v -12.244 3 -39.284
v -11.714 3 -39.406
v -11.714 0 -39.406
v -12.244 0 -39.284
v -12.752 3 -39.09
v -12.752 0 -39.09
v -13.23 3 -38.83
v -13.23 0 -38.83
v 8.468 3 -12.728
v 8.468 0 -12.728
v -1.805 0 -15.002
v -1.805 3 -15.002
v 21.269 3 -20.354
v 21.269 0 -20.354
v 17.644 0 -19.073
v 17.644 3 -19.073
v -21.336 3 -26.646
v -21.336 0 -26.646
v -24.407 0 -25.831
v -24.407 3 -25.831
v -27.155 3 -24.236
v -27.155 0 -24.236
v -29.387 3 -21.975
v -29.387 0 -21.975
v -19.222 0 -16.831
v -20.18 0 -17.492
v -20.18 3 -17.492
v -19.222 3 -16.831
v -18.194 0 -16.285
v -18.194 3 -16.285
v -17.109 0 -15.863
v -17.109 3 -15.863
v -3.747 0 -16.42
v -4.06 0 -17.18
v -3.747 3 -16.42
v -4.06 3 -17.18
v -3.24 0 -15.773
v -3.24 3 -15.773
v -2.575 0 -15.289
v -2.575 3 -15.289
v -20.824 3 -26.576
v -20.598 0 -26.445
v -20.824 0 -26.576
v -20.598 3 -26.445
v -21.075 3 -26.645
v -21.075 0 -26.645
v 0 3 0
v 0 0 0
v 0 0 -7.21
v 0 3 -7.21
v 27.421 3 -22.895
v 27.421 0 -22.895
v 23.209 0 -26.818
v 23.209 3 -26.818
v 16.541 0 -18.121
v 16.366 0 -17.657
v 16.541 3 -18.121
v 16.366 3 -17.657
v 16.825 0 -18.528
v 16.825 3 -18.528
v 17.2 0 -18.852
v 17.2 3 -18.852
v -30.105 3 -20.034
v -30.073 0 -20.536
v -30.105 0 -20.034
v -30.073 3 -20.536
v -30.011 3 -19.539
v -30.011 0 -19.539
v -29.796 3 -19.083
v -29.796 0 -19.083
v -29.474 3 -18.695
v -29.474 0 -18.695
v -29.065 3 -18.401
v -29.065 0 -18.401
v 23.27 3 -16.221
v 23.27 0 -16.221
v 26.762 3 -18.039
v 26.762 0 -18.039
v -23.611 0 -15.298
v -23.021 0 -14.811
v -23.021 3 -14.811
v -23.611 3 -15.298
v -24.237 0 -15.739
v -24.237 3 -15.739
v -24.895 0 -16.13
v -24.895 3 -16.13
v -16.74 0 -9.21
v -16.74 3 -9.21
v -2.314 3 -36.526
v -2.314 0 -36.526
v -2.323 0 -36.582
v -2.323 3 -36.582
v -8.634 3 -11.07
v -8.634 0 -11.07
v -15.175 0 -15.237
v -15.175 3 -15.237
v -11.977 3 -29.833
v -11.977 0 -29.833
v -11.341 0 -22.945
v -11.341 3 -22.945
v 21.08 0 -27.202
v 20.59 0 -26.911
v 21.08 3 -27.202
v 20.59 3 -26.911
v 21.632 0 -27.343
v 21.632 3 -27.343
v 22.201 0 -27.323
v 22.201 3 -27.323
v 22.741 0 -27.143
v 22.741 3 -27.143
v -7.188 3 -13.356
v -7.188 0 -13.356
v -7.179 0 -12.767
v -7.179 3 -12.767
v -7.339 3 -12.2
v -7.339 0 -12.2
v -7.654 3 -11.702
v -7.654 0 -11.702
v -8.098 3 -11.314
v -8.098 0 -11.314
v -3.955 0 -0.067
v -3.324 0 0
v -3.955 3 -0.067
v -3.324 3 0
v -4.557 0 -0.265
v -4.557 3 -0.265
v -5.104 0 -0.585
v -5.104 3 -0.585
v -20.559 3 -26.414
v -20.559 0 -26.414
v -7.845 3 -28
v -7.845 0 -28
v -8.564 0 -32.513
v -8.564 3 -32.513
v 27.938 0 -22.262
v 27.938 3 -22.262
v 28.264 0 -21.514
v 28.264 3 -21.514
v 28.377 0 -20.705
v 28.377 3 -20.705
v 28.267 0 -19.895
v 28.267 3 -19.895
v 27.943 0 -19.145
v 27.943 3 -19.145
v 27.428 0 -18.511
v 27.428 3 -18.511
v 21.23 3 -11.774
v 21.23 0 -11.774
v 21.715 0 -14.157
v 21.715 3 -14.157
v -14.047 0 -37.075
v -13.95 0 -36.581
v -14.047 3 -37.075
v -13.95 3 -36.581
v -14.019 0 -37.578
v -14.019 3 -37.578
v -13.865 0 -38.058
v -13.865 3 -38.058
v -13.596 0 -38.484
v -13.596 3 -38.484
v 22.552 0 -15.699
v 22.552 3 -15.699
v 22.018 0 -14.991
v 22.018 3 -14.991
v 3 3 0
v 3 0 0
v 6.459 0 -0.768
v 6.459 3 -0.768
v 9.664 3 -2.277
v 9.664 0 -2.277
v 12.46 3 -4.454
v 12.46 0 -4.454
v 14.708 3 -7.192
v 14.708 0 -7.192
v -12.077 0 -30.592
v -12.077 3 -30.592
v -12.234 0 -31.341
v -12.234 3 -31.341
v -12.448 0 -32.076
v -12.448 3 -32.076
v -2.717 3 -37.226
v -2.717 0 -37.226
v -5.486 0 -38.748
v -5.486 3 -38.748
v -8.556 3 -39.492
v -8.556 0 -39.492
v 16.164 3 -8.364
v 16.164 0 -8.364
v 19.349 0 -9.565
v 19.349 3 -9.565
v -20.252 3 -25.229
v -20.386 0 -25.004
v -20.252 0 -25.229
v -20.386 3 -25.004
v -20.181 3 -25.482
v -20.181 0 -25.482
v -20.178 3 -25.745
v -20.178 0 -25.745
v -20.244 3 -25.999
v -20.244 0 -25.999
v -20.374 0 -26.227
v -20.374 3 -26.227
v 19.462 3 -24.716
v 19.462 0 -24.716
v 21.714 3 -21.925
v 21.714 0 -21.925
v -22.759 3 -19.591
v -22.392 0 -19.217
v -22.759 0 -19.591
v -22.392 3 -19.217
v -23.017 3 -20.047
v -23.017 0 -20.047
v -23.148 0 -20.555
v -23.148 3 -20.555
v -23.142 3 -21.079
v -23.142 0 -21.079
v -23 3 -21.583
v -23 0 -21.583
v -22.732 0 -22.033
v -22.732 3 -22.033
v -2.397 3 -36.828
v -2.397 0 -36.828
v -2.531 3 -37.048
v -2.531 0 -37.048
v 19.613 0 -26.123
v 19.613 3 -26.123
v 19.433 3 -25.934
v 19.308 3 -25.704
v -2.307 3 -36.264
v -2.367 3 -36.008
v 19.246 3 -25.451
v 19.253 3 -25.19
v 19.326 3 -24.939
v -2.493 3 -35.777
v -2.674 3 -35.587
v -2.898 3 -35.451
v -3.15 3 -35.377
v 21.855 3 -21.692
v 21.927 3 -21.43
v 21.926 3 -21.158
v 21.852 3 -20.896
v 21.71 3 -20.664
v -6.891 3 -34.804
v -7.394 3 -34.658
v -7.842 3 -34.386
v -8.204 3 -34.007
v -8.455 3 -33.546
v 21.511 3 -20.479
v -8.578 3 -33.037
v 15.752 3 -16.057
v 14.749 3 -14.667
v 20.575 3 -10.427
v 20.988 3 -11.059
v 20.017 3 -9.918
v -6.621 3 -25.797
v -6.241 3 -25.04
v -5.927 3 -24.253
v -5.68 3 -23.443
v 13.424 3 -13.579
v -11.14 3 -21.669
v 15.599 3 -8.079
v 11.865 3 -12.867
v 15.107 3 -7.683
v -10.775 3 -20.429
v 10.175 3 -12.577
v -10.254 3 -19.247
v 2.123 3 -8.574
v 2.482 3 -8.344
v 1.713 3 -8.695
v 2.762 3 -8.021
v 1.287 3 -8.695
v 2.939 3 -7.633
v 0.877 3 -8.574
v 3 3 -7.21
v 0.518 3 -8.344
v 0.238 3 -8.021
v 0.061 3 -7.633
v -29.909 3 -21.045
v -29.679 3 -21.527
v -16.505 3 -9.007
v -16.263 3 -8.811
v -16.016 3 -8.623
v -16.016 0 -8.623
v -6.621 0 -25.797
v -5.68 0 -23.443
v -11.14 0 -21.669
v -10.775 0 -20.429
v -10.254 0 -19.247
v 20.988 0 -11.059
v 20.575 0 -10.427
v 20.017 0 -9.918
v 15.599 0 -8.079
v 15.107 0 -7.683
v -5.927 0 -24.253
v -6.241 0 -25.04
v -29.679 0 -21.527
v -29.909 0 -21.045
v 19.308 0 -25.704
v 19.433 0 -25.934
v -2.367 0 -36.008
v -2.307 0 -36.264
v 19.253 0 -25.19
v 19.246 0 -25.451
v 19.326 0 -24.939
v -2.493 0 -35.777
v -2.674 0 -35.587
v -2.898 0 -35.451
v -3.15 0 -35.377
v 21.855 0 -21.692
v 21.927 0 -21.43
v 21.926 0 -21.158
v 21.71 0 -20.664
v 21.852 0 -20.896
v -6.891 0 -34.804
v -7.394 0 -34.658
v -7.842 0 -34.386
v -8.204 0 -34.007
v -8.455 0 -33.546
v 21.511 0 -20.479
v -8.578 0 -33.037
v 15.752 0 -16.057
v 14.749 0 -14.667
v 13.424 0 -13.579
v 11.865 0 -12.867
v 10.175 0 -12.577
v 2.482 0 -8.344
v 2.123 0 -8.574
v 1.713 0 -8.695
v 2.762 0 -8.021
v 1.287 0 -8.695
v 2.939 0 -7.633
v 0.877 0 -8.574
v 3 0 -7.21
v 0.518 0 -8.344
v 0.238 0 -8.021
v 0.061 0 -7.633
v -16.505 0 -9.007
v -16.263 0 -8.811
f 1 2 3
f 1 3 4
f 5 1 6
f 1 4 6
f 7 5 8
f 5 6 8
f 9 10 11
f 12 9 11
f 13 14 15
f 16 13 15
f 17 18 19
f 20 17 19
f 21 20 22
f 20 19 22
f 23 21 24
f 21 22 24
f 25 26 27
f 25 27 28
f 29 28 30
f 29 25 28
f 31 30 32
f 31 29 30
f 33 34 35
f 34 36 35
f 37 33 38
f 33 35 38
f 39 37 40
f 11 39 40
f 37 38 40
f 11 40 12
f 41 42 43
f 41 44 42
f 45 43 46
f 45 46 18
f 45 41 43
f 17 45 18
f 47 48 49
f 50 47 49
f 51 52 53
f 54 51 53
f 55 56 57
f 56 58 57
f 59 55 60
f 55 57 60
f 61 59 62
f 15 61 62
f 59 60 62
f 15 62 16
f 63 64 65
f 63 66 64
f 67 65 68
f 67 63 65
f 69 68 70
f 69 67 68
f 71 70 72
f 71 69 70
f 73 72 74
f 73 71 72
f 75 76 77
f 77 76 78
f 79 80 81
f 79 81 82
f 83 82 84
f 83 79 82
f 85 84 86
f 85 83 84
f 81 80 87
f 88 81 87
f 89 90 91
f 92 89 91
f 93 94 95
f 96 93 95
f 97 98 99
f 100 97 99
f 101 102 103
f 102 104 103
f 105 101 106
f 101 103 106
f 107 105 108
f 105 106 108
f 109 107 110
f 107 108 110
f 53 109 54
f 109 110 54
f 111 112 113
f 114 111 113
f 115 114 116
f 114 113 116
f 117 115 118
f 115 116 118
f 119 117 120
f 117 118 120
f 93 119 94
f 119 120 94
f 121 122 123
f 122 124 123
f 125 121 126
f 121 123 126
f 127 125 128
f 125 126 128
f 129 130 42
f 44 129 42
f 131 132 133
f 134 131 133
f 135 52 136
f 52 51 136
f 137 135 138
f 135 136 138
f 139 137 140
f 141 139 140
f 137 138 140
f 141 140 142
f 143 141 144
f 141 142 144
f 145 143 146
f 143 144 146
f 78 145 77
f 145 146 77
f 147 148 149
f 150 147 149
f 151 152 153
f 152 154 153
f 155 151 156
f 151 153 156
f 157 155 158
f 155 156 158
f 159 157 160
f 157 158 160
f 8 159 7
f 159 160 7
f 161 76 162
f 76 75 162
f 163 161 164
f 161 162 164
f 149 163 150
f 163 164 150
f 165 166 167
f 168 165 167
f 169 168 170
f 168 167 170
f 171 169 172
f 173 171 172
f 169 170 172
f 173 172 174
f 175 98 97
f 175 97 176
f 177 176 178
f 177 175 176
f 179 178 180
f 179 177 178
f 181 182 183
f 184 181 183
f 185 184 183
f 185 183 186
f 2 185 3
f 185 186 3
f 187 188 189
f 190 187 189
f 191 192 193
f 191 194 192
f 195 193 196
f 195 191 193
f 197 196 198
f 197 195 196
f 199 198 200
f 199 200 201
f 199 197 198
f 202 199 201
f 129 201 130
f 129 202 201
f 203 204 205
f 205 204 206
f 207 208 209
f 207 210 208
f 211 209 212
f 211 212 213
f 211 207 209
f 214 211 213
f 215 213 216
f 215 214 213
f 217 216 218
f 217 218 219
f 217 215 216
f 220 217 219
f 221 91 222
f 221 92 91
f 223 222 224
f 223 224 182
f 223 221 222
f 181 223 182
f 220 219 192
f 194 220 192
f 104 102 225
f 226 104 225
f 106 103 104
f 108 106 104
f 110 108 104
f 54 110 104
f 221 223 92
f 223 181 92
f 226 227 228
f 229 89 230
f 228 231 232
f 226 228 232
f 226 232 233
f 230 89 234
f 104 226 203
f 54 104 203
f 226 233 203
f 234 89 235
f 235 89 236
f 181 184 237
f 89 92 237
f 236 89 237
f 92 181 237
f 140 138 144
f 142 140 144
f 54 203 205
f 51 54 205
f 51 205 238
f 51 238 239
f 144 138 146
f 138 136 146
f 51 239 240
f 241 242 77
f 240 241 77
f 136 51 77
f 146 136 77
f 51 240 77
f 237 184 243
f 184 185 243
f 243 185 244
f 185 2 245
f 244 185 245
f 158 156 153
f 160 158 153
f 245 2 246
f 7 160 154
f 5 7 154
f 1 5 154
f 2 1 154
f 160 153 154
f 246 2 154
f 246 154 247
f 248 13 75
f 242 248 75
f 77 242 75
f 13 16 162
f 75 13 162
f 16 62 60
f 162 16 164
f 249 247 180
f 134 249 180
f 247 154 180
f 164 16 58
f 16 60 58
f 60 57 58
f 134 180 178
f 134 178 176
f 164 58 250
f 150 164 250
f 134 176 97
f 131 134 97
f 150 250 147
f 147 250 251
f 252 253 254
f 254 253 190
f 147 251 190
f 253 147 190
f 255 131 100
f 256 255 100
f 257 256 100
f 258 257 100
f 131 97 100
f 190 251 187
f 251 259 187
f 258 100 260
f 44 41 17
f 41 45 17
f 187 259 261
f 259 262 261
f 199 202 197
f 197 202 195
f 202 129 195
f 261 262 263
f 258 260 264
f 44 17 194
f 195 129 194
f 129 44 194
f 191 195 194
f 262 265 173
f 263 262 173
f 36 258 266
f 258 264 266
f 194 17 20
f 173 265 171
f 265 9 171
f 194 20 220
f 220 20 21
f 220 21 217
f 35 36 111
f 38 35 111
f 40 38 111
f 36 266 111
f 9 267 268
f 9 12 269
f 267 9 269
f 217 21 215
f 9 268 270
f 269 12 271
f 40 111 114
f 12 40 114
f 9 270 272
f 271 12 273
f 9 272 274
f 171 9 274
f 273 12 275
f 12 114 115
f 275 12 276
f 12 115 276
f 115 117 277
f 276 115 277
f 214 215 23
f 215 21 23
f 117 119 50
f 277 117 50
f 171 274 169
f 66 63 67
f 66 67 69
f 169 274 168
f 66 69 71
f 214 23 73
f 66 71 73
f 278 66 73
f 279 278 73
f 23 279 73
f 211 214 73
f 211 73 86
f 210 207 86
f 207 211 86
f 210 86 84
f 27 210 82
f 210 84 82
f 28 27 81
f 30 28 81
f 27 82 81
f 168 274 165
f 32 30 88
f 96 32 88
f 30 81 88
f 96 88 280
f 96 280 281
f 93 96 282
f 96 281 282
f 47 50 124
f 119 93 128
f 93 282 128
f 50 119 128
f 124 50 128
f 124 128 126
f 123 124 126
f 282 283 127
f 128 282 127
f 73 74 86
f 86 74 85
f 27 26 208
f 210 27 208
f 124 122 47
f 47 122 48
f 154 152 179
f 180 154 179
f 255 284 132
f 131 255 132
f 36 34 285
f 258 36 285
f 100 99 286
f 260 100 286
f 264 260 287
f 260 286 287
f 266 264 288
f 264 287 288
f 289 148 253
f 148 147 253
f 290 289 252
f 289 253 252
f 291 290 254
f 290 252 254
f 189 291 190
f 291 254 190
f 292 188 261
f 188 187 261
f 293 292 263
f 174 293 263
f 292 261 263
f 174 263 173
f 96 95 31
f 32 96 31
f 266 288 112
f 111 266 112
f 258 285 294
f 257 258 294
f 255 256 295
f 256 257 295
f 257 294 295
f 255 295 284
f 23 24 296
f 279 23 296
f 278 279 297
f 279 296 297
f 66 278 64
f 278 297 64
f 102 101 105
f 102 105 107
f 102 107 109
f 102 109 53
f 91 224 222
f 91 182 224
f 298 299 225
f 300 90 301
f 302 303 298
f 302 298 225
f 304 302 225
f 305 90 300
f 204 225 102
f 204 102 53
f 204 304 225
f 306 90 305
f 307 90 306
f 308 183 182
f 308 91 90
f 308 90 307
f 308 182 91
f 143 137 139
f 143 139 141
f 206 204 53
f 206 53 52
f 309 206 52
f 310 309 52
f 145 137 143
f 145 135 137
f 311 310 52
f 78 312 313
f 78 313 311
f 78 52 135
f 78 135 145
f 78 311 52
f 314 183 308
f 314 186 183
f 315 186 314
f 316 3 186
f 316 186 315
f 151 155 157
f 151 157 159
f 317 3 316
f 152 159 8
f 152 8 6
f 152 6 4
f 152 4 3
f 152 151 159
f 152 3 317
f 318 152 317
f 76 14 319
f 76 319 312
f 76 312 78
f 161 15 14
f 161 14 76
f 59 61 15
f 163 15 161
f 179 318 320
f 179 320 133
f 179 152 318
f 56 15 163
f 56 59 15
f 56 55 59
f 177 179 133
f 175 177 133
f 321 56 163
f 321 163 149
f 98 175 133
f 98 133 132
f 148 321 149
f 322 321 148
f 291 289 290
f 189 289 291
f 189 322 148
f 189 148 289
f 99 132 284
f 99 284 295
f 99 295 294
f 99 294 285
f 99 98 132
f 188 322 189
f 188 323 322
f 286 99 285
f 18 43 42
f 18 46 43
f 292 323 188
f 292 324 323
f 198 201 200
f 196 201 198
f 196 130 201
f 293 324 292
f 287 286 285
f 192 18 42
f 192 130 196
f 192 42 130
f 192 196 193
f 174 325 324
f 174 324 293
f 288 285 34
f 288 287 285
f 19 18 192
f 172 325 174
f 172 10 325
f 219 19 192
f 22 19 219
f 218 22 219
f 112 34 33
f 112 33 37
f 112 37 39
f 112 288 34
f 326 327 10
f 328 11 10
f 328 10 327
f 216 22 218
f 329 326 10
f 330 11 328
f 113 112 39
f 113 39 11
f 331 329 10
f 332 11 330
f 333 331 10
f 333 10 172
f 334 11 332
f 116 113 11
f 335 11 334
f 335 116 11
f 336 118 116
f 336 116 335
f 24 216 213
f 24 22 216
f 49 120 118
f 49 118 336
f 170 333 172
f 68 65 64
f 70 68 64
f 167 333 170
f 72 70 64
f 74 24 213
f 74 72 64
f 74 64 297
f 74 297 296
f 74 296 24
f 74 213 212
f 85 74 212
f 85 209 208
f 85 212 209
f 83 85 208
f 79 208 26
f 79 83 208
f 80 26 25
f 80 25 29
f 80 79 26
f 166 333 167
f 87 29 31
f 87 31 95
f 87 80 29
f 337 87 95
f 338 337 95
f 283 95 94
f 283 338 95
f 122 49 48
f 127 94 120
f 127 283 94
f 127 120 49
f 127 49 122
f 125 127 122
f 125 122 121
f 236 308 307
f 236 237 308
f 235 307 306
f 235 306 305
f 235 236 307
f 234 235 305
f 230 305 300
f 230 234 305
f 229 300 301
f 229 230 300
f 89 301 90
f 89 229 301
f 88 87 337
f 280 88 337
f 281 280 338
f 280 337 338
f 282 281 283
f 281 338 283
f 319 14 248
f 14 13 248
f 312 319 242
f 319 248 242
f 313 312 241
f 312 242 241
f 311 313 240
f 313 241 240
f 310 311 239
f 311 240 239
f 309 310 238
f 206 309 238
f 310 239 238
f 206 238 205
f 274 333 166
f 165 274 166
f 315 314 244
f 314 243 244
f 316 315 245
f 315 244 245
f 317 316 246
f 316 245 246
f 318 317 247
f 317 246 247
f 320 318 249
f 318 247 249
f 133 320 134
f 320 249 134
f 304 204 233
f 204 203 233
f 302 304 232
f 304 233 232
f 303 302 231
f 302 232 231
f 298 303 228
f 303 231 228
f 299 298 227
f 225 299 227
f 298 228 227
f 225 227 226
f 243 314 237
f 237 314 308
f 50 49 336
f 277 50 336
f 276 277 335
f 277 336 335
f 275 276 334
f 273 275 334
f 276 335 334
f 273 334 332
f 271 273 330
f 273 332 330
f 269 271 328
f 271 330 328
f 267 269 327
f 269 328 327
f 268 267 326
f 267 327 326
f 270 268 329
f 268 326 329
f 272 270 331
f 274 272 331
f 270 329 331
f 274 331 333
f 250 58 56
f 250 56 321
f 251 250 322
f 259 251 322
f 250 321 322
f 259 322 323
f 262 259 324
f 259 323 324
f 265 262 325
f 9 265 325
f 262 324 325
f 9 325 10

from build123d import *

# Parameters (mm, degrees)
BOSS_EXTRUDE1_DEPTH = 3
FILLET1_R           = 10
FILLET2_R           = 2
FILLET3_R           = 4
FILLET4_R           = 1
FILLET5_R           = 2
FILLET6_R           = 3
FILLET7_R           = 2
FILLET8_R           = 1


with BuildPart() as part:
    # Sketch1 → Boss-Extrude1 (new body)
    with BuildSketch(Plane(origin=(0, 0, 0), x_dir=(1, 0, 0), z_dir=(0, 1, 0))):
        with BuildLine():
            Line((0, 0), (0, 7.21))
            ThreePointArc((0, 7.21), (1.5, 8.71), (3, 7.21))
            Line((3, 7.21), (3, 0))
            ThreePointArc((3, 0), (10.063508451, 2.530649612), (15.2, 8))
            Line((15.2, 8), (20.9, 10.15))
            Line((20.9, 10.15), (22, 15.56))
            Line((22, 15.56), (30.53, 20))
            Line((30.53, 20), (21.94, 28))
            Line((21.94, 28), (18.834507406, 25.494802254))
            Line((18.834507406, 25.494802254), (22.601722061, 20.824888578))
            Line((22.601722061, 20.824888578), (16.53, 18.68))
            ThreePointArc((16.53, 18.68), (13.852574152, 13.870404311), (8.467766761, 12.728183128))
            Line((8.467766761, 12.728183128), (-3.6, 15.4))
            Line((-3.6, 15.4), (-6, 24.68))
            Line((-6, 24.68), (-7.84518958, 28))
            Line((-7.84518958, 28), (-8.88, 34.5))
            Line((-8.88, 34.5), (-2.152236064, 35.529882091))
            Line((-2.152236064, 35.529882091), (-2.387170471, 36.974018228))
            ThreePointArc((-2.387170471, 36.974018228), (-7.295622624, 39.289989721), (-12.7222653, 39.199569746))
            Line((-12.7222653, 39.199569746), (-14.412236064, 37.968616292))
            Line((-14.412236064, 37.968616292), (-12.083283256, 30.98175787))
            Line((-12.083283256, 30.98175787), (-11.160586433, 20.989038892))
            Line((-11.160586433, 20.989038892), (-7.18770511, 13.356453829))
            ThreePointArc((-7.18770511, 13.356453829), (-7.478060289, 11.939326713), (-8.633960614, 11.06958547))
            Line((-8.633960614, 11.06958547), (-15.174962181, 15.236636279))
            Line((-15.174962181, 15.236636279), (-18.788682966, 16.406314301))
            Line((-18.788682966, 16.406314301), (-23.978484738, 20.454374352))
            Line((-23.978484738, 20.454374352), (-19.760487577, 25.795906403))
            Line((-19.760487577, 25.795906403), (-20.917206202, 26.691855832))
            ThreePointArc((-20.917206202, 26.691855832), (-26.082048226, 24.977316424), (-29.953541863, 21.152819654))
            Line((-29.953541863, 21.152819654), (-30.35, 19.1))
            Line((-30.35, 19.1), (-23.881685757, 15.578477225))
            Line((-23.881685757, 15.578477225), (-16.391850065, 8.899542932))
            Line((-16.391850065, 8.899542932), (-4.31, 0))
            Line((-4.31, 0), (0, 0))
        make_face()
    extrude(amount=BOSS_EXTRUDE1_DEPTH)

    # Fillet1
    # the kernel refuses this fillet: 10 mm, written as the material it adds along each edge
    with BuildSketch(Plane(origin=(-23.881685757, 0, -15.578477225), x_dir=(0.7463543086555258, 0, 0.6655488306287767), z_dir=(0, 1, 0))) as fillet1_piece_1:
        with BuildLine():
            CenterArc((FILLET1_R * 0.115344853594, -FILLET1_R), FILLET1_R, 90, 13.159392789)
            Line((-FILLET1_R * 0.112315955105, -FILLET1_R * 0.0262595026484), (0, 0))
            Line((0, 0), (FILLET1_R * 0.115344853594, 0))
        make_face()
    extrude(amount=3)
    with BuildSketch(Plane(origin=(-18.788682966, 0, -16.406314301), x_dir=(0.9514034075145552, 0, 0.3079473269403278), z_dir=(0, 1, 0))) as fillet1_piece_2:
        with BuildLine():
            CenterArc((FILLET1_R * 0.176495798458, FILLET1_R), FILLET1_R, 249.981238779, 20.018761221)
            Line((-FILLET1_R * 0.165832024258, FILLET1_R * 0.0604194224044), (0, 0))
            Line((0, 0), (FILLET1_R * 0.176495798458, 0))
        make_face()
    extrude(amount=3)
    with BuildSketch(Plane(origin=(-12.083283256, 0, -30.98175787), x_dir=(-0.3162277660168379, 0, -0.9486832980505138), z_dir=(0, 1, 0))) as fillet1_piece_3:
        with BuildLine():
            CenterArc((FILLET1_R * 0.115344853594, FILLET1_R), FILLET1_R, 256.840607211, 13.159392789)
            Line((-FILLET1_R * 0.112315955105, FILLET1_R * 0.0262595026484), (0, 0))
            Line((0, 0), (FILLET1_R * 0.115344853594, 0))
        make_face()
    extrude(amount=3)
    # the kernel refuses this fillet: 10 mm, written as the material it takes off along each edge
    with BuildSketch(Plane(origin=(-16.391850065, -1.167802292, -8.899542932), x_dir=(-0.7463543086555279, 0, -0.6655488306287745), z_dir=(0, 1, 0))) as fillet1_2_piece_1:
        with BuildLine():
            CenterArc((FILLET1_R * 0.0467120916838, -FILLET1_R), FILLET1_R, 90, 5.348923188)
            Line((-FILLET1_R * 0.0465086821366, -FILLET1_R * 0.00435453733353), (0, 0))
            Line((0, 0), (FILLET1_R * 0.0467120916838, 0))
        make_face()
    extrude(amount=5.335604584, mode=Mode.SUBTRACT)
    with BuildSketch(Plane(origin=(-11.160586433, -4.90982012, -20.989038892), x_dir=(-0.09194577532432974, 0, -0.9957640154173116), z_dir=(0, 1, 0))) as fillet1_2_piece_2:
        with BuildLine():
            CenterArc((FILLET1_R * 0.196392804796, -FILLET1_R), FILLET1_R, 90, 22.222134755)
            Line((-FILLET1_R * 0.18180564018, -FILLET1_R * 0.0742754533783), (0, 0))
            Line((0, 0), (FILLET1_R * 0.196392804796, 0))
        make_face()
    extrude(amount=12.81964024, mode=Mode.SUBTRACT)
    with BuildSketch(Plane(origin=(-6, -3.194649605, -24.68), x_dir=(0.2503828219685178, 0, 0.9681469116116013), z_dir=(0, 1, 0))) as fillet1_2_piece_3:
        with BuildLine():
            CenterArc((FILLET1_R * 0.127785984198, -FILLET1_R), FILLET1_R, 90, 14.564262893)
            Line((-FILLET1_R * 0.123679735642, -FILLET1_R * 0.0321337945019), (0, 0))
            Line((0, 0), (FILLET1_R * 0.127785984198, 0))
        make_face()
    extrude(amount=9.38929921, mode=Mode.SUBTRACT)

    # Fillet2
    fillet2_edges = [part.edges().sort_by_distance(p)[0] for p in [
        (-30.35, 1.5, -19.1),
        (-14.412236064, 1.5, -37.968616292),
    ]]
    fillet(fillet2_edges, radius=FILLET2_R)

    # Fillet3
    # the kernel refuses this fillet: 4 mm, written as the material it takes off along each edge
    with BuildSketch(Plane(origin=(-12.7222653, -2.572689519, -39.199569746), x_dir=(-0.8083072770831305, 0, 0.5887608562179175), z_dir=(0, 1, 0))) as fillet3_piece_1:
        with BuildLine():
            CenterArc((0.875361271, 3.992337402), FILLET3_R, 243.063834504, 23.389134387)
            ThreePointArc((-0.936628841, 0.426290314), (-0.472898898, 0.203072318), (0, 0))
            Line((0, 0), (0.627889929, 0))
        make_face()
    extrude(amount=8.145379038, mode=Mode.SUBTRACT)
    with BuildSketch(Plane(origin=(-29.953541863, -2.496436383, -21.152819654), x_dir=(-0.18962458073088623, 0, 0.9818566689607173), z_dir=(0, 1, 0))) as fillet3_piece_2:
        with BuildLine():
            CenterArc((0.842574318, 3.994234672), FILLET3_R, 243.941405888, 22.981988472)
            ThreePointArc((-0.914585995, 0.400853585), (-0.461476033, 0.190882795), (0, 0))
            Line((0, 0), (0.627889929, 0))
        make_face()
    extrude(amount=7.992872766, mode=Mode.SUBTRACT)

    # Fillet4
    fillet4_edges = [part.edges().sort_by_distance(p)[0] for p in [
        (-20.917206202, 1.5, -26.691855832),
        (-19.760487577, 1.5, -25.795906403),
        (-2.387170471, 1.5, -36.974018228),
        (-2.152236064, 1.5, -35.529882091),
    ]]
    fillet(fillet4_edges, radius=FILLET4_R)

    # Fillet5
    fillet5_edges = [part.edges().sort_by_distance(p)[0] for p in [
        (-23.978484738, 1.5, -20.454374352),
        (-8.88, 1.5, -34.5),
    ]]
    fillet(fillet5_edges, radius=FILLET5_R)

    # Fillet6
    fillet6_edges = [part.edges().sort_by_distance(p)[0] for p in [
        (-4.31, 1.5, 0),
        (-3.6, 1.5, -15.4),
        (30.53, 1.5, -20),
        (22, 1.5, -15.56),
        (20.9, 1.5, -10.15),
        (15.2, 1.5, -8),
    ]]
    fillet(fillet6_edges, radius=FILLET6_R)

    # Fillet7
    fillet7_edges = [part.edges().sort_by_distance(p)[0] for p in [
        (16.53, 1.5, -18.68),
        (21.94, 1.5, -28),
    ]]
    fillet(fillet7_edges, radius=FILLET7_R)

    # Fillet8
    fillet8_edges = [part.edges().sort_by_distance(p)[0] for p in [
        (22.601722061, 1.5, -20.824888578),
        (18.834507406, 1.5, -25.494802254),
    ]]
    fillet(fillet8_edges, radius=FILLET8_R)


solid = part.part
